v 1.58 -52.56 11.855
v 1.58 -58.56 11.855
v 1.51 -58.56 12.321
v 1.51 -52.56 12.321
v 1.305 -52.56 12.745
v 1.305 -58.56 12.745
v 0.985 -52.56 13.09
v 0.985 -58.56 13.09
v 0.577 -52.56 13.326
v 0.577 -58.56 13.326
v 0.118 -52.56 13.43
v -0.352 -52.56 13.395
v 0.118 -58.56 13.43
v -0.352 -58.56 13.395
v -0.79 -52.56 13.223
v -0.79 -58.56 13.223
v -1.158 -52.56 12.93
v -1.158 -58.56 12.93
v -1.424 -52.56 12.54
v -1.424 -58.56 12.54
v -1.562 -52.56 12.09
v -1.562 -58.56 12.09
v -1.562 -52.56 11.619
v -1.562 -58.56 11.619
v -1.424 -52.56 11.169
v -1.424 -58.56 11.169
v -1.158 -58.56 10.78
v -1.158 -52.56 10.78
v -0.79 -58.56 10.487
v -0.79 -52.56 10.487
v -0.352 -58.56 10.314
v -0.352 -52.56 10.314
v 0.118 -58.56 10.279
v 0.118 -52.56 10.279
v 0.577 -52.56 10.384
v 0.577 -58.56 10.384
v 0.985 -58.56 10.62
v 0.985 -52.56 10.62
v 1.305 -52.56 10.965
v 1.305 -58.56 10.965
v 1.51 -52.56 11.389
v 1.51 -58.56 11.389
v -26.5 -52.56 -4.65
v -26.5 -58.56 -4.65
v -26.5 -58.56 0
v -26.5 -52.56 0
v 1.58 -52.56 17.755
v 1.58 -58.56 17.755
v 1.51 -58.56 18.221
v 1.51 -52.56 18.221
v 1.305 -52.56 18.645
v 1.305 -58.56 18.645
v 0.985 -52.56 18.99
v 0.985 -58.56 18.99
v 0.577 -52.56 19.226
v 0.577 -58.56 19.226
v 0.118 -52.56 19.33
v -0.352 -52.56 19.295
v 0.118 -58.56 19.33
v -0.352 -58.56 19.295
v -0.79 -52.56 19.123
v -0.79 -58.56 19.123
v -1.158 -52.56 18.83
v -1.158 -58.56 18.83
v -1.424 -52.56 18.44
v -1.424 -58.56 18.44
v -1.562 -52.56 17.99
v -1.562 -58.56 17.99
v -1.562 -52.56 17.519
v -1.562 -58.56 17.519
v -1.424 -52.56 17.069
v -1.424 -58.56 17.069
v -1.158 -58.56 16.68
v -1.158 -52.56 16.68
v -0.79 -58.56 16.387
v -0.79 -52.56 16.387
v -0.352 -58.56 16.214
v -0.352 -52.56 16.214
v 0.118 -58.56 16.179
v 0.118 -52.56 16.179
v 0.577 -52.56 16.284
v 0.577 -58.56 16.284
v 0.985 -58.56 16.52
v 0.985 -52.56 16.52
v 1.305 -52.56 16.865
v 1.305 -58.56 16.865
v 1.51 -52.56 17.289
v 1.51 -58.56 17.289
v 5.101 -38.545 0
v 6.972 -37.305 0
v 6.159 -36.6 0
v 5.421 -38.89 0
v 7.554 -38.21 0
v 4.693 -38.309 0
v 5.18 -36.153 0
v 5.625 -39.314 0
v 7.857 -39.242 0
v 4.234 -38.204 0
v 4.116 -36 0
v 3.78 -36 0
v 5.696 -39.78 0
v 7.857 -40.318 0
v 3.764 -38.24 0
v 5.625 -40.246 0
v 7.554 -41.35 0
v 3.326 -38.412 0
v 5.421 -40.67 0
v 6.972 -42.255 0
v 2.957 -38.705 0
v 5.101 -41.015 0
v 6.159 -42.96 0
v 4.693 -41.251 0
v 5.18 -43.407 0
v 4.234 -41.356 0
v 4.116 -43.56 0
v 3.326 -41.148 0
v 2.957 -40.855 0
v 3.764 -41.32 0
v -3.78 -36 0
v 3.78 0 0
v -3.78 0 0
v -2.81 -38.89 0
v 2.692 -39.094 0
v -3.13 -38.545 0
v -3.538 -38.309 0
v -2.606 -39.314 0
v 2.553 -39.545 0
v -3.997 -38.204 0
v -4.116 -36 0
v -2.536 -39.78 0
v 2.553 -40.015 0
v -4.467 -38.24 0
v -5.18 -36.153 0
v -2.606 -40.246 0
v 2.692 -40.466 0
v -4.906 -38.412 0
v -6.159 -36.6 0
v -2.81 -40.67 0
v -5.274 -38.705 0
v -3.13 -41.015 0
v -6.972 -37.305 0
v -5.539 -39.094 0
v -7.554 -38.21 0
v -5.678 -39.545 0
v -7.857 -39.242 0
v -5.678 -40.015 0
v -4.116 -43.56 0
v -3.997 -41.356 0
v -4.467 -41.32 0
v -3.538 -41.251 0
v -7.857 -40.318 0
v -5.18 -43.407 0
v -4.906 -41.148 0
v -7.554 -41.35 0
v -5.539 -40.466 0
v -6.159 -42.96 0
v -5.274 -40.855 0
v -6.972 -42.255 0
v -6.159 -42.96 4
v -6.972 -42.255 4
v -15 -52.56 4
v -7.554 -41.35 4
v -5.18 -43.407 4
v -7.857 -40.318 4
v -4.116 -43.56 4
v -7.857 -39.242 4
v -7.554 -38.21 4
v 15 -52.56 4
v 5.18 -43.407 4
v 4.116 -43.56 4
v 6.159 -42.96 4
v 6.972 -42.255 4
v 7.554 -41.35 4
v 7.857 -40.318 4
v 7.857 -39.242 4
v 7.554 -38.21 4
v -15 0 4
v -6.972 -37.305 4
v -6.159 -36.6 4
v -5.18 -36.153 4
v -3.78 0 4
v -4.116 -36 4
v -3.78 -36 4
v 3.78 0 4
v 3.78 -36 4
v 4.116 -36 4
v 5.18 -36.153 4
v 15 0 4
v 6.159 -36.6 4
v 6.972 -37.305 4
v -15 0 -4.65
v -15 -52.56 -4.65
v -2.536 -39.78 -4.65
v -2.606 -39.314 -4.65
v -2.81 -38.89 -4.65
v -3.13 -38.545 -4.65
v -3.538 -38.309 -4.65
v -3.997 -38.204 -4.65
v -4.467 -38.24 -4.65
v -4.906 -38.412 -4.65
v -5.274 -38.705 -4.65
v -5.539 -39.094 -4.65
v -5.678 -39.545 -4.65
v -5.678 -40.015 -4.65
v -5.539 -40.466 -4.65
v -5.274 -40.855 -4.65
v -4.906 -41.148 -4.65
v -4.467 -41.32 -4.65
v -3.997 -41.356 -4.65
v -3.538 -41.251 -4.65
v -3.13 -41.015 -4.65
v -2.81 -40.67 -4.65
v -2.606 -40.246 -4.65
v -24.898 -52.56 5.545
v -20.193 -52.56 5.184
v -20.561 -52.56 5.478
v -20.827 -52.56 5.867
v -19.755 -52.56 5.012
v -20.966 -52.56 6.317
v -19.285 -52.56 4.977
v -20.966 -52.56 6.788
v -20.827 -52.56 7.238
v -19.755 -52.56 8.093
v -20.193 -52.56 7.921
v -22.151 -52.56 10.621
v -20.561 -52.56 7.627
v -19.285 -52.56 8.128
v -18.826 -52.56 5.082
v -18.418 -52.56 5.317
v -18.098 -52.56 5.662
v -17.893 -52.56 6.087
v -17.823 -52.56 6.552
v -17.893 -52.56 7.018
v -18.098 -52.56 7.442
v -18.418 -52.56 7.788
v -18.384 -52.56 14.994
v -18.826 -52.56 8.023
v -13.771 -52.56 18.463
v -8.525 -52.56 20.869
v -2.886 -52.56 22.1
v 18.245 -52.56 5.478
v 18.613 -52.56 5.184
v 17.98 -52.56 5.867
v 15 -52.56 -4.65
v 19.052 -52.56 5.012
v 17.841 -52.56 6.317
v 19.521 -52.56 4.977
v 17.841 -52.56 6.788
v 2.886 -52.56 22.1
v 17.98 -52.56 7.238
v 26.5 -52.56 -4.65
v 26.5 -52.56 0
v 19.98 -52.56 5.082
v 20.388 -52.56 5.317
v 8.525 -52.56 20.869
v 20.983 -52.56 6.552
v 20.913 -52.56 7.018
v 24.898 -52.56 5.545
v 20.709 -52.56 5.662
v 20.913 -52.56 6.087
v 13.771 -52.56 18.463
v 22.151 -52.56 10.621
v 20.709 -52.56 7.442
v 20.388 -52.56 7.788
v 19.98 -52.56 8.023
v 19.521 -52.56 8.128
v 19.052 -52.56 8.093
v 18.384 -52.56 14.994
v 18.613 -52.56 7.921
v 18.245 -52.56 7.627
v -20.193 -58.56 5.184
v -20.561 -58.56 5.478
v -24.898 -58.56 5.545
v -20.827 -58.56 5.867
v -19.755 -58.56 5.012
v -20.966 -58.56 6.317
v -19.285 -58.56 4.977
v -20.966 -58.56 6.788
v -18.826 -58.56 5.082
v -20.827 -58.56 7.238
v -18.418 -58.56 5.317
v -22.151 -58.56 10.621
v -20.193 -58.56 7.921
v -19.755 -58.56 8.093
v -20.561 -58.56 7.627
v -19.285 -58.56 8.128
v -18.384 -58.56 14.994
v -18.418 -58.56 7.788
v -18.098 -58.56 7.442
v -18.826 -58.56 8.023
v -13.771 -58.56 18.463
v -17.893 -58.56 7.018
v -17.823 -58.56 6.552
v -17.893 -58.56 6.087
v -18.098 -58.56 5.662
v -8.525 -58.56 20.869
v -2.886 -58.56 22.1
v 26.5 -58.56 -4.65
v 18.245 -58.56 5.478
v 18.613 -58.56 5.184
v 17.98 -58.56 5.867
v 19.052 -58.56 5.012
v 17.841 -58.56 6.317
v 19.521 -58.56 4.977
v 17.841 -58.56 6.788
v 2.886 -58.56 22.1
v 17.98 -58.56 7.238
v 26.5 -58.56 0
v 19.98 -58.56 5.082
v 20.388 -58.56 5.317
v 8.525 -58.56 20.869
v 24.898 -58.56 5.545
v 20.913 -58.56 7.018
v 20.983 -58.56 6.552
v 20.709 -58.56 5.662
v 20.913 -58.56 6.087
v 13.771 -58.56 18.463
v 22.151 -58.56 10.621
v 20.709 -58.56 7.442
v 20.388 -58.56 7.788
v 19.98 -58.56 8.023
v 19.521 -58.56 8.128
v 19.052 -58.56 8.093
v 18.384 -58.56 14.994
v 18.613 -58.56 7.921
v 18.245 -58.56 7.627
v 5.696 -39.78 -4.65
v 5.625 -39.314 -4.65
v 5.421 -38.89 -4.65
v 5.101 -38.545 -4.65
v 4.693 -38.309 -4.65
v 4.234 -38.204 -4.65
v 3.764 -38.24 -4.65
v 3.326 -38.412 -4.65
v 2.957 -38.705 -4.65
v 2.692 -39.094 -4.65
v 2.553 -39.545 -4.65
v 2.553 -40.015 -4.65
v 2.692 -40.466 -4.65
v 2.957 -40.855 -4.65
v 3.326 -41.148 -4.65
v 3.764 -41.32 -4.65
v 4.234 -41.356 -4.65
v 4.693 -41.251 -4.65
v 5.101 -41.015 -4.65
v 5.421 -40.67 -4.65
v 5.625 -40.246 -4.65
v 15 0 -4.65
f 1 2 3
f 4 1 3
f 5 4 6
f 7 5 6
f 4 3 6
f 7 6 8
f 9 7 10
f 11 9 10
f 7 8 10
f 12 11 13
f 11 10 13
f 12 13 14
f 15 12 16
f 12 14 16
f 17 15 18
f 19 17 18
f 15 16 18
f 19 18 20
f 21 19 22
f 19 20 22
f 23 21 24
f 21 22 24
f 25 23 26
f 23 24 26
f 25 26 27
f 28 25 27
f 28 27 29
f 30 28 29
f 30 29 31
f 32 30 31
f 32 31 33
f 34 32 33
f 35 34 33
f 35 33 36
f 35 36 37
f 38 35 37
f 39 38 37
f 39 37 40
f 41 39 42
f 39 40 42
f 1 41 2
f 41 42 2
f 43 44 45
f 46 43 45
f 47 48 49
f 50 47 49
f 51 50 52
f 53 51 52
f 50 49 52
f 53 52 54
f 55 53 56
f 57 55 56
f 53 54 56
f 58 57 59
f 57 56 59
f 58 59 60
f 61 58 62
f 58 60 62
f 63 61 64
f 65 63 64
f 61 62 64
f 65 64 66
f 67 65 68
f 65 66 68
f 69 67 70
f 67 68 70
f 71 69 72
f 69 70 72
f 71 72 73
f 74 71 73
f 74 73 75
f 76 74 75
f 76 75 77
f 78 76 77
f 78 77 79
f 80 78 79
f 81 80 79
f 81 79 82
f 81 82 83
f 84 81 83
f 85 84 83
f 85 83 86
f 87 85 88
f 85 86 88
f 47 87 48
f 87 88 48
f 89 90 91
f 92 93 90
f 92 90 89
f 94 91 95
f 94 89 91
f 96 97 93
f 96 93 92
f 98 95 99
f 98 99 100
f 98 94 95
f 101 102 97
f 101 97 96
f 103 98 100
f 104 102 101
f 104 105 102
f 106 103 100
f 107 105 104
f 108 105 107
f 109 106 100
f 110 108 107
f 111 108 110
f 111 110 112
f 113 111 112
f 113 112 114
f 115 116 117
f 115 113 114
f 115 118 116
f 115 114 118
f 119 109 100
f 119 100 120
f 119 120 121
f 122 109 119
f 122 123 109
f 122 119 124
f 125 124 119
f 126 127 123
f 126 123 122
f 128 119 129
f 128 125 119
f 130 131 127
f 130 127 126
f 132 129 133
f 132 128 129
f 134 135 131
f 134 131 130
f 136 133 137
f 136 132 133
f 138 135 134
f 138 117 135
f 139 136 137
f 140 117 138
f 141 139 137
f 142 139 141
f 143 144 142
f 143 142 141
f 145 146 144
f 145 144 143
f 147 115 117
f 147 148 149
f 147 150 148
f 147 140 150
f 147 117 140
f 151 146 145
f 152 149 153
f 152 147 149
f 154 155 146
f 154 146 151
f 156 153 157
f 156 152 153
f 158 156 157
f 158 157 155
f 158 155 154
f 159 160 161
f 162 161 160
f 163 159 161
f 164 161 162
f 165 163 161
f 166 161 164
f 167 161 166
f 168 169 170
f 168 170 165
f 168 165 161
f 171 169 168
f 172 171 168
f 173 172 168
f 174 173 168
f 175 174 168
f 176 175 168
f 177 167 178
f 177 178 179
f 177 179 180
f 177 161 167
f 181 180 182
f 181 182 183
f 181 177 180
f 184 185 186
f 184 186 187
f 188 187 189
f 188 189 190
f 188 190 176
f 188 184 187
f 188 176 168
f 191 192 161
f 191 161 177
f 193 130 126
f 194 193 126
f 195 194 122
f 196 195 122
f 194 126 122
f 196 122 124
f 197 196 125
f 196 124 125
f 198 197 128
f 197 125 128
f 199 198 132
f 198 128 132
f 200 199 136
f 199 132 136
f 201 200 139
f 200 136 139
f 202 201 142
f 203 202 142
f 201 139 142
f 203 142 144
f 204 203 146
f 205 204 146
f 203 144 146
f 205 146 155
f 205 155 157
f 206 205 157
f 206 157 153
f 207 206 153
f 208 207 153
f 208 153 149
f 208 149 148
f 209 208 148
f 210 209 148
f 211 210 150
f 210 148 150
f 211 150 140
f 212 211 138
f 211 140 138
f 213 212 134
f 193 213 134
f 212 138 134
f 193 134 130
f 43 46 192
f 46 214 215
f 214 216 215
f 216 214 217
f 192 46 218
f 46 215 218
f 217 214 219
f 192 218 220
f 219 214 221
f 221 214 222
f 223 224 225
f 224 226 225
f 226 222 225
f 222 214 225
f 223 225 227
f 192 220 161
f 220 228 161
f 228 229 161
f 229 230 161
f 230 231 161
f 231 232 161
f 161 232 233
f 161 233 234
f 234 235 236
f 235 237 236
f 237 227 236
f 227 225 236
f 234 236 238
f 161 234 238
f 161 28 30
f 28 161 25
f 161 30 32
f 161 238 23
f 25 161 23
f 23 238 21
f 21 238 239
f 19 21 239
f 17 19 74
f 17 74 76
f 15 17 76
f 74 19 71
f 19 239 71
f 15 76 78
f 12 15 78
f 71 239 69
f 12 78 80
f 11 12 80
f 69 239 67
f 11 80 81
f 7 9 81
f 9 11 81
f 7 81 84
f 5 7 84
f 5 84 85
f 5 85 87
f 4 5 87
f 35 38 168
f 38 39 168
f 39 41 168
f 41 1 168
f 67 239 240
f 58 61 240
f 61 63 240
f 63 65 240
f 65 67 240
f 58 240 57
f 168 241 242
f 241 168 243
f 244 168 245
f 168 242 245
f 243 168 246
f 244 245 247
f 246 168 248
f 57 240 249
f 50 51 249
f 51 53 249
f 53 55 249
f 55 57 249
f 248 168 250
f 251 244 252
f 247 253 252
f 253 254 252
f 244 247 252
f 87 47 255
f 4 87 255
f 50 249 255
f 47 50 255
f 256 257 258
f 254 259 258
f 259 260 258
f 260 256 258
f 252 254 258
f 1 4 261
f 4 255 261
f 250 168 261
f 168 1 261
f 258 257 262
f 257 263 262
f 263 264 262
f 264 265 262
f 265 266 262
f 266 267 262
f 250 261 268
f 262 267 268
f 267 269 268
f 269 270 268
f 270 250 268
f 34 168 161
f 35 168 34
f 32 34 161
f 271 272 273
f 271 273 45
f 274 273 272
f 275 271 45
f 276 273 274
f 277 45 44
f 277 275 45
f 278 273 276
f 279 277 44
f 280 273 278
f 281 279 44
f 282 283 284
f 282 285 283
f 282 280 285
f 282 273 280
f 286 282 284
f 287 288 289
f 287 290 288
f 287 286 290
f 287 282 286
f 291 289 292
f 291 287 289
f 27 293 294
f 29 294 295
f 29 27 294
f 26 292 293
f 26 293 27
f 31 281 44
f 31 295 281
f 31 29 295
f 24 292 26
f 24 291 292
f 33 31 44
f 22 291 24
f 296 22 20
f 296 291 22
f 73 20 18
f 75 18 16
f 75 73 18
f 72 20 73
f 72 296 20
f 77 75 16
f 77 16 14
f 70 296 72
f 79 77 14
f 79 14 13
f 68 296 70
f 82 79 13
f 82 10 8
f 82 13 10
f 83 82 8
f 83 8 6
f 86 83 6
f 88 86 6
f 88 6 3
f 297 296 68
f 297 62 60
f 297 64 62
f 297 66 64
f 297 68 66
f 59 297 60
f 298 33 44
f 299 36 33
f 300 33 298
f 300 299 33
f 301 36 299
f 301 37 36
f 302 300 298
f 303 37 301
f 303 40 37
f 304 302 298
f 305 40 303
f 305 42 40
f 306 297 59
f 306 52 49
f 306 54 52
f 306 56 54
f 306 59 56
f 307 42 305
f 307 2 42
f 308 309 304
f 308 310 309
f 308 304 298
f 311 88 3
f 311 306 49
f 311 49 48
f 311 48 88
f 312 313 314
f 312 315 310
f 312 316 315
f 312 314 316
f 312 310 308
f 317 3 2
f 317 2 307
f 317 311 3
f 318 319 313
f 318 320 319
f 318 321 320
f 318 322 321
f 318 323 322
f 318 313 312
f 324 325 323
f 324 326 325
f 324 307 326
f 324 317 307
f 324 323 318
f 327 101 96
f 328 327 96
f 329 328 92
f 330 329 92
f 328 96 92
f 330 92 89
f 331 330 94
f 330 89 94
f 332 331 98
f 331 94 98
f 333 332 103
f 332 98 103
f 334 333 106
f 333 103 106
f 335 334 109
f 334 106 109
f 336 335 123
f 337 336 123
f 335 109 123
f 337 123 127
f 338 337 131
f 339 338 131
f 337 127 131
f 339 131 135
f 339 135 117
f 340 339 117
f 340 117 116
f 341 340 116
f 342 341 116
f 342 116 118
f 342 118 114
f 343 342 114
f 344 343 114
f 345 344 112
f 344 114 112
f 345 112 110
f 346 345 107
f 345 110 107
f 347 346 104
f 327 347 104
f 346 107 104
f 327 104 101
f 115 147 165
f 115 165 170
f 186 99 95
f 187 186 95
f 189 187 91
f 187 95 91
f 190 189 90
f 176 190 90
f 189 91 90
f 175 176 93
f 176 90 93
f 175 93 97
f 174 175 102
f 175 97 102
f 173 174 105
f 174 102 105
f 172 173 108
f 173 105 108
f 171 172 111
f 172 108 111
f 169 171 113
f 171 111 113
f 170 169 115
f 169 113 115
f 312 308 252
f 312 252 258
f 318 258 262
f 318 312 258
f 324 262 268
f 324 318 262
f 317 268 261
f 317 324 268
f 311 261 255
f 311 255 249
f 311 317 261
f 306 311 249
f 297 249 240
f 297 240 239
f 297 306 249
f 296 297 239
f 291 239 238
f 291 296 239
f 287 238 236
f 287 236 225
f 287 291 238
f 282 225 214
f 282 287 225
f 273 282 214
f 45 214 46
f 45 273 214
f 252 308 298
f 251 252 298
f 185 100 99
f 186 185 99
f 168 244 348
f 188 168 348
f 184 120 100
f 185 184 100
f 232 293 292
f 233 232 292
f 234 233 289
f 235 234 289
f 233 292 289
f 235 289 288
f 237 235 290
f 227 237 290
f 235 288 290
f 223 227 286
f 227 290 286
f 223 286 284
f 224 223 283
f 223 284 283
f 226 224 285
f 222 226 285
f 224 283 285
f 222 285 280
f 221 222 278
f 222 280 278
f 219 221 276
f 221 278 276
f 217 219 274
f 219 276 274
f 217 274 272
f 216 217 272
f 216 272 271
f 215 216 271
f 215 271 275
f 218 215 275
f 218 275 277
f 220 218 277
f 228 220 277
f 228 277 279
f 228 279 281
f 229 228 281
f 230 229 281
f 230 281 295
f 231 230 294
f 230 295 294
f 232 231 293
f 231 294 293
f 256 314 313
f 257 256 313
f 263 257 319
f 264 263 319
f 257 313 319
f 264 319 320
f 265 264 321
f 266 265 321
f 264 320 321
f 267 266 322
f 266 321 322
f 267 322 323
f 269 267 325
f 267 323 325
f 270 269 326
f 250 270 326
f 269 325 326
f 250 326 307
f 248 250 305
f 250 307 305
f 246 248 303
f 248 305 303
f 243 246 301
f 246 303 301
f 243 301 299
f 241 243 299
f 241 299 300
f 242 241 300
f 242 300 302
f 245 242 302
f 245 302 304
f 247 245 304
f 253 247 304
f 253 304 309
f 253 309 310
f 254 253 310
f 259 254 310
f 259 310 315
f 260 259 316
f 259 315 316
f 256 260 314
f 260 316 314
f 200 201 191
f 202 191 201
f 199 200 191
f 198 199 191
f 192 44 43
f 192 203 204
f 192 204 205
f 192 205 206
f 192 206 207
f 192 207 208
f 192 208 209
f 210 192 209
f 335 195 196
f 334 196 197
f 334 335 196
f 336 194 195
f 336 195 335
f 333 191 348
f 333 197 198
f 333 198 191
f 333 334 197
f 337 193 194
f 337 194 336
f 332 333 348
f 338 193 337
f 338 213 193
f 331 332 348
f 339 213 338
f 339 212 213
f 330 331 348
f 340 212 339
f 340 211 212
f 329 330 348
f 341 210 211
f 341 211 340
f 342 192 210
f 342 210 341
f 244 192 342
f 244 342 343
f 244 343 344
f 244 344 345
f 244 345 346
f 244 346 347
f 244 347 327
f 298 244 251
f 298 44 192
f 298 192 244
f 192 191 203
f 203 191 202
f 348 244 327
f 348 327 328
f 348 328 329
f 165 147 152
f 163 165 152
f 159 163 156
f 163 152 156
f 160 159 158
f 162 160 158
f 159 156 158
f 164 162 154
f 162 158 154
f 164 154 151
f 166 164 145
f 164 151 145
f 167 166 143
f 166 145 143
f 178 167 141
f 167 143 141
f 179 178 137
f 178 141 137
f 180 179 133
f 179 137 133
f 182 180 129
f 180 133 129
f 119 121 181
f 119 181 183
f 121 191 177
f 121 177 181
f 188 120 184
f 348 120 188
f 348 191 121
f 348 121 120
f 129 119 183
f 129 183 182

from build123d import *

# Parameters (mm, degrees)
PAD_DEPTH         = 4
SKETCH001_W       = 30
SKETCH001_H       = 58.56
PAD001_DEPTH      = 8.65
SKETCH002_R       = 1.58
PAD002_DEPTH      = 6
SKETCH003_R       = 1.58
POCKET_DEPTH      = 4.651
POCKET_DEPTH_BACK = 22.255879


with BuildPart() as key:
    # Sketch → Pad (new body)
    with BuildSketch(Plane.XY):
        with BuildLine():
            Line((-3.78, 0), (-3.78, 36))
            Line((-3.78, 36), (-4.11555, 36))
            ThreePointArc((-4.11555, 43.56), (-7.89555, 39.78), (-4.11555, 36))
            Line((-4.11555, 43.56), (4.11555, 43.56))
            ThreePointArc((4.11555, 36), (7.89555, 39.78), (4.11555, 43.56))
            Line((3.78, 36), (4.11555, 36))
            Line((3.78, 0), (3.78, 36))
            Line((-3.78, 0), (3.78, 0))
        make_face()
    pad = extrude(amount=PAD_DEPTH)

    # Mirrored: Pad across Sketch H_Axis
    add(pad.mirror(Plane.ZX))


with BuildPart() as cut:
    # Sketch001 → Pad001 (new body)
    with BuildSketch(Plane.XY.offset(-4.65)):
        with Locations((0, -29.28)):
            Rectangle(SKETCH001_W, SKETCH001_H)
    extrude(amount=PAD001_DEPTH)

    # Sketch002 → Pad002 (join)
    with BuildSketch(Plane.XZ.offset(58.56)):
        with BuildLine():
            ThreePointArc((26.5, 0), (0, 22.254879), (-26.5, 0))
            Line((-26.5, -2.325), (-26.5, 0))
            Line((-26.5, -4.65), (-26.5, -2.325))
            Line((-26.5, -4.65), (26.5, -4.65))
            Line((26.5, 0), (26.5, -4.65))
        make_face()
        with Locations((-19.403194, 6.552439)):
            Circle(SKETCH002_R, mode=Mode.SUBTRACT)
        with Locations((19.403194, 6.552439)):
            Circle(SKETCH002_R, mode=Mode.SUBTRACT)
        with Locations((0, 17.754879)):
            Circle(SKETCH002_R, mode=Mode.SUBTRACT)
        with Locations((0, 11.854879)):
            Circle(SKETCH002_R, mode=Mode.SUBTRACT)
    extrude(amount=-PAD002_DEPTH)

    # Sketch003 → Pocket (cut, two sides)
    with BuildSketch(Plane.XY) as pocket_sk:
        with Locations((-4.11555, -39.78)):
            Circle(SKETCH003_R)
        with Locations((4.11555, -39.78)):
            Circle(SKETCH003_R)
    extrude(amount=-POCKET_DEPTH, mode=Mode.SUBTRACT)
    extrude(pocket_sk.sketch, amount=POCKET_DEPTH_BACK, mode=Mode.SUBTRACT)

    # Cut: cut key
    add(key.part, mode=Mode.SUBTRACT)


solid = cut.part
